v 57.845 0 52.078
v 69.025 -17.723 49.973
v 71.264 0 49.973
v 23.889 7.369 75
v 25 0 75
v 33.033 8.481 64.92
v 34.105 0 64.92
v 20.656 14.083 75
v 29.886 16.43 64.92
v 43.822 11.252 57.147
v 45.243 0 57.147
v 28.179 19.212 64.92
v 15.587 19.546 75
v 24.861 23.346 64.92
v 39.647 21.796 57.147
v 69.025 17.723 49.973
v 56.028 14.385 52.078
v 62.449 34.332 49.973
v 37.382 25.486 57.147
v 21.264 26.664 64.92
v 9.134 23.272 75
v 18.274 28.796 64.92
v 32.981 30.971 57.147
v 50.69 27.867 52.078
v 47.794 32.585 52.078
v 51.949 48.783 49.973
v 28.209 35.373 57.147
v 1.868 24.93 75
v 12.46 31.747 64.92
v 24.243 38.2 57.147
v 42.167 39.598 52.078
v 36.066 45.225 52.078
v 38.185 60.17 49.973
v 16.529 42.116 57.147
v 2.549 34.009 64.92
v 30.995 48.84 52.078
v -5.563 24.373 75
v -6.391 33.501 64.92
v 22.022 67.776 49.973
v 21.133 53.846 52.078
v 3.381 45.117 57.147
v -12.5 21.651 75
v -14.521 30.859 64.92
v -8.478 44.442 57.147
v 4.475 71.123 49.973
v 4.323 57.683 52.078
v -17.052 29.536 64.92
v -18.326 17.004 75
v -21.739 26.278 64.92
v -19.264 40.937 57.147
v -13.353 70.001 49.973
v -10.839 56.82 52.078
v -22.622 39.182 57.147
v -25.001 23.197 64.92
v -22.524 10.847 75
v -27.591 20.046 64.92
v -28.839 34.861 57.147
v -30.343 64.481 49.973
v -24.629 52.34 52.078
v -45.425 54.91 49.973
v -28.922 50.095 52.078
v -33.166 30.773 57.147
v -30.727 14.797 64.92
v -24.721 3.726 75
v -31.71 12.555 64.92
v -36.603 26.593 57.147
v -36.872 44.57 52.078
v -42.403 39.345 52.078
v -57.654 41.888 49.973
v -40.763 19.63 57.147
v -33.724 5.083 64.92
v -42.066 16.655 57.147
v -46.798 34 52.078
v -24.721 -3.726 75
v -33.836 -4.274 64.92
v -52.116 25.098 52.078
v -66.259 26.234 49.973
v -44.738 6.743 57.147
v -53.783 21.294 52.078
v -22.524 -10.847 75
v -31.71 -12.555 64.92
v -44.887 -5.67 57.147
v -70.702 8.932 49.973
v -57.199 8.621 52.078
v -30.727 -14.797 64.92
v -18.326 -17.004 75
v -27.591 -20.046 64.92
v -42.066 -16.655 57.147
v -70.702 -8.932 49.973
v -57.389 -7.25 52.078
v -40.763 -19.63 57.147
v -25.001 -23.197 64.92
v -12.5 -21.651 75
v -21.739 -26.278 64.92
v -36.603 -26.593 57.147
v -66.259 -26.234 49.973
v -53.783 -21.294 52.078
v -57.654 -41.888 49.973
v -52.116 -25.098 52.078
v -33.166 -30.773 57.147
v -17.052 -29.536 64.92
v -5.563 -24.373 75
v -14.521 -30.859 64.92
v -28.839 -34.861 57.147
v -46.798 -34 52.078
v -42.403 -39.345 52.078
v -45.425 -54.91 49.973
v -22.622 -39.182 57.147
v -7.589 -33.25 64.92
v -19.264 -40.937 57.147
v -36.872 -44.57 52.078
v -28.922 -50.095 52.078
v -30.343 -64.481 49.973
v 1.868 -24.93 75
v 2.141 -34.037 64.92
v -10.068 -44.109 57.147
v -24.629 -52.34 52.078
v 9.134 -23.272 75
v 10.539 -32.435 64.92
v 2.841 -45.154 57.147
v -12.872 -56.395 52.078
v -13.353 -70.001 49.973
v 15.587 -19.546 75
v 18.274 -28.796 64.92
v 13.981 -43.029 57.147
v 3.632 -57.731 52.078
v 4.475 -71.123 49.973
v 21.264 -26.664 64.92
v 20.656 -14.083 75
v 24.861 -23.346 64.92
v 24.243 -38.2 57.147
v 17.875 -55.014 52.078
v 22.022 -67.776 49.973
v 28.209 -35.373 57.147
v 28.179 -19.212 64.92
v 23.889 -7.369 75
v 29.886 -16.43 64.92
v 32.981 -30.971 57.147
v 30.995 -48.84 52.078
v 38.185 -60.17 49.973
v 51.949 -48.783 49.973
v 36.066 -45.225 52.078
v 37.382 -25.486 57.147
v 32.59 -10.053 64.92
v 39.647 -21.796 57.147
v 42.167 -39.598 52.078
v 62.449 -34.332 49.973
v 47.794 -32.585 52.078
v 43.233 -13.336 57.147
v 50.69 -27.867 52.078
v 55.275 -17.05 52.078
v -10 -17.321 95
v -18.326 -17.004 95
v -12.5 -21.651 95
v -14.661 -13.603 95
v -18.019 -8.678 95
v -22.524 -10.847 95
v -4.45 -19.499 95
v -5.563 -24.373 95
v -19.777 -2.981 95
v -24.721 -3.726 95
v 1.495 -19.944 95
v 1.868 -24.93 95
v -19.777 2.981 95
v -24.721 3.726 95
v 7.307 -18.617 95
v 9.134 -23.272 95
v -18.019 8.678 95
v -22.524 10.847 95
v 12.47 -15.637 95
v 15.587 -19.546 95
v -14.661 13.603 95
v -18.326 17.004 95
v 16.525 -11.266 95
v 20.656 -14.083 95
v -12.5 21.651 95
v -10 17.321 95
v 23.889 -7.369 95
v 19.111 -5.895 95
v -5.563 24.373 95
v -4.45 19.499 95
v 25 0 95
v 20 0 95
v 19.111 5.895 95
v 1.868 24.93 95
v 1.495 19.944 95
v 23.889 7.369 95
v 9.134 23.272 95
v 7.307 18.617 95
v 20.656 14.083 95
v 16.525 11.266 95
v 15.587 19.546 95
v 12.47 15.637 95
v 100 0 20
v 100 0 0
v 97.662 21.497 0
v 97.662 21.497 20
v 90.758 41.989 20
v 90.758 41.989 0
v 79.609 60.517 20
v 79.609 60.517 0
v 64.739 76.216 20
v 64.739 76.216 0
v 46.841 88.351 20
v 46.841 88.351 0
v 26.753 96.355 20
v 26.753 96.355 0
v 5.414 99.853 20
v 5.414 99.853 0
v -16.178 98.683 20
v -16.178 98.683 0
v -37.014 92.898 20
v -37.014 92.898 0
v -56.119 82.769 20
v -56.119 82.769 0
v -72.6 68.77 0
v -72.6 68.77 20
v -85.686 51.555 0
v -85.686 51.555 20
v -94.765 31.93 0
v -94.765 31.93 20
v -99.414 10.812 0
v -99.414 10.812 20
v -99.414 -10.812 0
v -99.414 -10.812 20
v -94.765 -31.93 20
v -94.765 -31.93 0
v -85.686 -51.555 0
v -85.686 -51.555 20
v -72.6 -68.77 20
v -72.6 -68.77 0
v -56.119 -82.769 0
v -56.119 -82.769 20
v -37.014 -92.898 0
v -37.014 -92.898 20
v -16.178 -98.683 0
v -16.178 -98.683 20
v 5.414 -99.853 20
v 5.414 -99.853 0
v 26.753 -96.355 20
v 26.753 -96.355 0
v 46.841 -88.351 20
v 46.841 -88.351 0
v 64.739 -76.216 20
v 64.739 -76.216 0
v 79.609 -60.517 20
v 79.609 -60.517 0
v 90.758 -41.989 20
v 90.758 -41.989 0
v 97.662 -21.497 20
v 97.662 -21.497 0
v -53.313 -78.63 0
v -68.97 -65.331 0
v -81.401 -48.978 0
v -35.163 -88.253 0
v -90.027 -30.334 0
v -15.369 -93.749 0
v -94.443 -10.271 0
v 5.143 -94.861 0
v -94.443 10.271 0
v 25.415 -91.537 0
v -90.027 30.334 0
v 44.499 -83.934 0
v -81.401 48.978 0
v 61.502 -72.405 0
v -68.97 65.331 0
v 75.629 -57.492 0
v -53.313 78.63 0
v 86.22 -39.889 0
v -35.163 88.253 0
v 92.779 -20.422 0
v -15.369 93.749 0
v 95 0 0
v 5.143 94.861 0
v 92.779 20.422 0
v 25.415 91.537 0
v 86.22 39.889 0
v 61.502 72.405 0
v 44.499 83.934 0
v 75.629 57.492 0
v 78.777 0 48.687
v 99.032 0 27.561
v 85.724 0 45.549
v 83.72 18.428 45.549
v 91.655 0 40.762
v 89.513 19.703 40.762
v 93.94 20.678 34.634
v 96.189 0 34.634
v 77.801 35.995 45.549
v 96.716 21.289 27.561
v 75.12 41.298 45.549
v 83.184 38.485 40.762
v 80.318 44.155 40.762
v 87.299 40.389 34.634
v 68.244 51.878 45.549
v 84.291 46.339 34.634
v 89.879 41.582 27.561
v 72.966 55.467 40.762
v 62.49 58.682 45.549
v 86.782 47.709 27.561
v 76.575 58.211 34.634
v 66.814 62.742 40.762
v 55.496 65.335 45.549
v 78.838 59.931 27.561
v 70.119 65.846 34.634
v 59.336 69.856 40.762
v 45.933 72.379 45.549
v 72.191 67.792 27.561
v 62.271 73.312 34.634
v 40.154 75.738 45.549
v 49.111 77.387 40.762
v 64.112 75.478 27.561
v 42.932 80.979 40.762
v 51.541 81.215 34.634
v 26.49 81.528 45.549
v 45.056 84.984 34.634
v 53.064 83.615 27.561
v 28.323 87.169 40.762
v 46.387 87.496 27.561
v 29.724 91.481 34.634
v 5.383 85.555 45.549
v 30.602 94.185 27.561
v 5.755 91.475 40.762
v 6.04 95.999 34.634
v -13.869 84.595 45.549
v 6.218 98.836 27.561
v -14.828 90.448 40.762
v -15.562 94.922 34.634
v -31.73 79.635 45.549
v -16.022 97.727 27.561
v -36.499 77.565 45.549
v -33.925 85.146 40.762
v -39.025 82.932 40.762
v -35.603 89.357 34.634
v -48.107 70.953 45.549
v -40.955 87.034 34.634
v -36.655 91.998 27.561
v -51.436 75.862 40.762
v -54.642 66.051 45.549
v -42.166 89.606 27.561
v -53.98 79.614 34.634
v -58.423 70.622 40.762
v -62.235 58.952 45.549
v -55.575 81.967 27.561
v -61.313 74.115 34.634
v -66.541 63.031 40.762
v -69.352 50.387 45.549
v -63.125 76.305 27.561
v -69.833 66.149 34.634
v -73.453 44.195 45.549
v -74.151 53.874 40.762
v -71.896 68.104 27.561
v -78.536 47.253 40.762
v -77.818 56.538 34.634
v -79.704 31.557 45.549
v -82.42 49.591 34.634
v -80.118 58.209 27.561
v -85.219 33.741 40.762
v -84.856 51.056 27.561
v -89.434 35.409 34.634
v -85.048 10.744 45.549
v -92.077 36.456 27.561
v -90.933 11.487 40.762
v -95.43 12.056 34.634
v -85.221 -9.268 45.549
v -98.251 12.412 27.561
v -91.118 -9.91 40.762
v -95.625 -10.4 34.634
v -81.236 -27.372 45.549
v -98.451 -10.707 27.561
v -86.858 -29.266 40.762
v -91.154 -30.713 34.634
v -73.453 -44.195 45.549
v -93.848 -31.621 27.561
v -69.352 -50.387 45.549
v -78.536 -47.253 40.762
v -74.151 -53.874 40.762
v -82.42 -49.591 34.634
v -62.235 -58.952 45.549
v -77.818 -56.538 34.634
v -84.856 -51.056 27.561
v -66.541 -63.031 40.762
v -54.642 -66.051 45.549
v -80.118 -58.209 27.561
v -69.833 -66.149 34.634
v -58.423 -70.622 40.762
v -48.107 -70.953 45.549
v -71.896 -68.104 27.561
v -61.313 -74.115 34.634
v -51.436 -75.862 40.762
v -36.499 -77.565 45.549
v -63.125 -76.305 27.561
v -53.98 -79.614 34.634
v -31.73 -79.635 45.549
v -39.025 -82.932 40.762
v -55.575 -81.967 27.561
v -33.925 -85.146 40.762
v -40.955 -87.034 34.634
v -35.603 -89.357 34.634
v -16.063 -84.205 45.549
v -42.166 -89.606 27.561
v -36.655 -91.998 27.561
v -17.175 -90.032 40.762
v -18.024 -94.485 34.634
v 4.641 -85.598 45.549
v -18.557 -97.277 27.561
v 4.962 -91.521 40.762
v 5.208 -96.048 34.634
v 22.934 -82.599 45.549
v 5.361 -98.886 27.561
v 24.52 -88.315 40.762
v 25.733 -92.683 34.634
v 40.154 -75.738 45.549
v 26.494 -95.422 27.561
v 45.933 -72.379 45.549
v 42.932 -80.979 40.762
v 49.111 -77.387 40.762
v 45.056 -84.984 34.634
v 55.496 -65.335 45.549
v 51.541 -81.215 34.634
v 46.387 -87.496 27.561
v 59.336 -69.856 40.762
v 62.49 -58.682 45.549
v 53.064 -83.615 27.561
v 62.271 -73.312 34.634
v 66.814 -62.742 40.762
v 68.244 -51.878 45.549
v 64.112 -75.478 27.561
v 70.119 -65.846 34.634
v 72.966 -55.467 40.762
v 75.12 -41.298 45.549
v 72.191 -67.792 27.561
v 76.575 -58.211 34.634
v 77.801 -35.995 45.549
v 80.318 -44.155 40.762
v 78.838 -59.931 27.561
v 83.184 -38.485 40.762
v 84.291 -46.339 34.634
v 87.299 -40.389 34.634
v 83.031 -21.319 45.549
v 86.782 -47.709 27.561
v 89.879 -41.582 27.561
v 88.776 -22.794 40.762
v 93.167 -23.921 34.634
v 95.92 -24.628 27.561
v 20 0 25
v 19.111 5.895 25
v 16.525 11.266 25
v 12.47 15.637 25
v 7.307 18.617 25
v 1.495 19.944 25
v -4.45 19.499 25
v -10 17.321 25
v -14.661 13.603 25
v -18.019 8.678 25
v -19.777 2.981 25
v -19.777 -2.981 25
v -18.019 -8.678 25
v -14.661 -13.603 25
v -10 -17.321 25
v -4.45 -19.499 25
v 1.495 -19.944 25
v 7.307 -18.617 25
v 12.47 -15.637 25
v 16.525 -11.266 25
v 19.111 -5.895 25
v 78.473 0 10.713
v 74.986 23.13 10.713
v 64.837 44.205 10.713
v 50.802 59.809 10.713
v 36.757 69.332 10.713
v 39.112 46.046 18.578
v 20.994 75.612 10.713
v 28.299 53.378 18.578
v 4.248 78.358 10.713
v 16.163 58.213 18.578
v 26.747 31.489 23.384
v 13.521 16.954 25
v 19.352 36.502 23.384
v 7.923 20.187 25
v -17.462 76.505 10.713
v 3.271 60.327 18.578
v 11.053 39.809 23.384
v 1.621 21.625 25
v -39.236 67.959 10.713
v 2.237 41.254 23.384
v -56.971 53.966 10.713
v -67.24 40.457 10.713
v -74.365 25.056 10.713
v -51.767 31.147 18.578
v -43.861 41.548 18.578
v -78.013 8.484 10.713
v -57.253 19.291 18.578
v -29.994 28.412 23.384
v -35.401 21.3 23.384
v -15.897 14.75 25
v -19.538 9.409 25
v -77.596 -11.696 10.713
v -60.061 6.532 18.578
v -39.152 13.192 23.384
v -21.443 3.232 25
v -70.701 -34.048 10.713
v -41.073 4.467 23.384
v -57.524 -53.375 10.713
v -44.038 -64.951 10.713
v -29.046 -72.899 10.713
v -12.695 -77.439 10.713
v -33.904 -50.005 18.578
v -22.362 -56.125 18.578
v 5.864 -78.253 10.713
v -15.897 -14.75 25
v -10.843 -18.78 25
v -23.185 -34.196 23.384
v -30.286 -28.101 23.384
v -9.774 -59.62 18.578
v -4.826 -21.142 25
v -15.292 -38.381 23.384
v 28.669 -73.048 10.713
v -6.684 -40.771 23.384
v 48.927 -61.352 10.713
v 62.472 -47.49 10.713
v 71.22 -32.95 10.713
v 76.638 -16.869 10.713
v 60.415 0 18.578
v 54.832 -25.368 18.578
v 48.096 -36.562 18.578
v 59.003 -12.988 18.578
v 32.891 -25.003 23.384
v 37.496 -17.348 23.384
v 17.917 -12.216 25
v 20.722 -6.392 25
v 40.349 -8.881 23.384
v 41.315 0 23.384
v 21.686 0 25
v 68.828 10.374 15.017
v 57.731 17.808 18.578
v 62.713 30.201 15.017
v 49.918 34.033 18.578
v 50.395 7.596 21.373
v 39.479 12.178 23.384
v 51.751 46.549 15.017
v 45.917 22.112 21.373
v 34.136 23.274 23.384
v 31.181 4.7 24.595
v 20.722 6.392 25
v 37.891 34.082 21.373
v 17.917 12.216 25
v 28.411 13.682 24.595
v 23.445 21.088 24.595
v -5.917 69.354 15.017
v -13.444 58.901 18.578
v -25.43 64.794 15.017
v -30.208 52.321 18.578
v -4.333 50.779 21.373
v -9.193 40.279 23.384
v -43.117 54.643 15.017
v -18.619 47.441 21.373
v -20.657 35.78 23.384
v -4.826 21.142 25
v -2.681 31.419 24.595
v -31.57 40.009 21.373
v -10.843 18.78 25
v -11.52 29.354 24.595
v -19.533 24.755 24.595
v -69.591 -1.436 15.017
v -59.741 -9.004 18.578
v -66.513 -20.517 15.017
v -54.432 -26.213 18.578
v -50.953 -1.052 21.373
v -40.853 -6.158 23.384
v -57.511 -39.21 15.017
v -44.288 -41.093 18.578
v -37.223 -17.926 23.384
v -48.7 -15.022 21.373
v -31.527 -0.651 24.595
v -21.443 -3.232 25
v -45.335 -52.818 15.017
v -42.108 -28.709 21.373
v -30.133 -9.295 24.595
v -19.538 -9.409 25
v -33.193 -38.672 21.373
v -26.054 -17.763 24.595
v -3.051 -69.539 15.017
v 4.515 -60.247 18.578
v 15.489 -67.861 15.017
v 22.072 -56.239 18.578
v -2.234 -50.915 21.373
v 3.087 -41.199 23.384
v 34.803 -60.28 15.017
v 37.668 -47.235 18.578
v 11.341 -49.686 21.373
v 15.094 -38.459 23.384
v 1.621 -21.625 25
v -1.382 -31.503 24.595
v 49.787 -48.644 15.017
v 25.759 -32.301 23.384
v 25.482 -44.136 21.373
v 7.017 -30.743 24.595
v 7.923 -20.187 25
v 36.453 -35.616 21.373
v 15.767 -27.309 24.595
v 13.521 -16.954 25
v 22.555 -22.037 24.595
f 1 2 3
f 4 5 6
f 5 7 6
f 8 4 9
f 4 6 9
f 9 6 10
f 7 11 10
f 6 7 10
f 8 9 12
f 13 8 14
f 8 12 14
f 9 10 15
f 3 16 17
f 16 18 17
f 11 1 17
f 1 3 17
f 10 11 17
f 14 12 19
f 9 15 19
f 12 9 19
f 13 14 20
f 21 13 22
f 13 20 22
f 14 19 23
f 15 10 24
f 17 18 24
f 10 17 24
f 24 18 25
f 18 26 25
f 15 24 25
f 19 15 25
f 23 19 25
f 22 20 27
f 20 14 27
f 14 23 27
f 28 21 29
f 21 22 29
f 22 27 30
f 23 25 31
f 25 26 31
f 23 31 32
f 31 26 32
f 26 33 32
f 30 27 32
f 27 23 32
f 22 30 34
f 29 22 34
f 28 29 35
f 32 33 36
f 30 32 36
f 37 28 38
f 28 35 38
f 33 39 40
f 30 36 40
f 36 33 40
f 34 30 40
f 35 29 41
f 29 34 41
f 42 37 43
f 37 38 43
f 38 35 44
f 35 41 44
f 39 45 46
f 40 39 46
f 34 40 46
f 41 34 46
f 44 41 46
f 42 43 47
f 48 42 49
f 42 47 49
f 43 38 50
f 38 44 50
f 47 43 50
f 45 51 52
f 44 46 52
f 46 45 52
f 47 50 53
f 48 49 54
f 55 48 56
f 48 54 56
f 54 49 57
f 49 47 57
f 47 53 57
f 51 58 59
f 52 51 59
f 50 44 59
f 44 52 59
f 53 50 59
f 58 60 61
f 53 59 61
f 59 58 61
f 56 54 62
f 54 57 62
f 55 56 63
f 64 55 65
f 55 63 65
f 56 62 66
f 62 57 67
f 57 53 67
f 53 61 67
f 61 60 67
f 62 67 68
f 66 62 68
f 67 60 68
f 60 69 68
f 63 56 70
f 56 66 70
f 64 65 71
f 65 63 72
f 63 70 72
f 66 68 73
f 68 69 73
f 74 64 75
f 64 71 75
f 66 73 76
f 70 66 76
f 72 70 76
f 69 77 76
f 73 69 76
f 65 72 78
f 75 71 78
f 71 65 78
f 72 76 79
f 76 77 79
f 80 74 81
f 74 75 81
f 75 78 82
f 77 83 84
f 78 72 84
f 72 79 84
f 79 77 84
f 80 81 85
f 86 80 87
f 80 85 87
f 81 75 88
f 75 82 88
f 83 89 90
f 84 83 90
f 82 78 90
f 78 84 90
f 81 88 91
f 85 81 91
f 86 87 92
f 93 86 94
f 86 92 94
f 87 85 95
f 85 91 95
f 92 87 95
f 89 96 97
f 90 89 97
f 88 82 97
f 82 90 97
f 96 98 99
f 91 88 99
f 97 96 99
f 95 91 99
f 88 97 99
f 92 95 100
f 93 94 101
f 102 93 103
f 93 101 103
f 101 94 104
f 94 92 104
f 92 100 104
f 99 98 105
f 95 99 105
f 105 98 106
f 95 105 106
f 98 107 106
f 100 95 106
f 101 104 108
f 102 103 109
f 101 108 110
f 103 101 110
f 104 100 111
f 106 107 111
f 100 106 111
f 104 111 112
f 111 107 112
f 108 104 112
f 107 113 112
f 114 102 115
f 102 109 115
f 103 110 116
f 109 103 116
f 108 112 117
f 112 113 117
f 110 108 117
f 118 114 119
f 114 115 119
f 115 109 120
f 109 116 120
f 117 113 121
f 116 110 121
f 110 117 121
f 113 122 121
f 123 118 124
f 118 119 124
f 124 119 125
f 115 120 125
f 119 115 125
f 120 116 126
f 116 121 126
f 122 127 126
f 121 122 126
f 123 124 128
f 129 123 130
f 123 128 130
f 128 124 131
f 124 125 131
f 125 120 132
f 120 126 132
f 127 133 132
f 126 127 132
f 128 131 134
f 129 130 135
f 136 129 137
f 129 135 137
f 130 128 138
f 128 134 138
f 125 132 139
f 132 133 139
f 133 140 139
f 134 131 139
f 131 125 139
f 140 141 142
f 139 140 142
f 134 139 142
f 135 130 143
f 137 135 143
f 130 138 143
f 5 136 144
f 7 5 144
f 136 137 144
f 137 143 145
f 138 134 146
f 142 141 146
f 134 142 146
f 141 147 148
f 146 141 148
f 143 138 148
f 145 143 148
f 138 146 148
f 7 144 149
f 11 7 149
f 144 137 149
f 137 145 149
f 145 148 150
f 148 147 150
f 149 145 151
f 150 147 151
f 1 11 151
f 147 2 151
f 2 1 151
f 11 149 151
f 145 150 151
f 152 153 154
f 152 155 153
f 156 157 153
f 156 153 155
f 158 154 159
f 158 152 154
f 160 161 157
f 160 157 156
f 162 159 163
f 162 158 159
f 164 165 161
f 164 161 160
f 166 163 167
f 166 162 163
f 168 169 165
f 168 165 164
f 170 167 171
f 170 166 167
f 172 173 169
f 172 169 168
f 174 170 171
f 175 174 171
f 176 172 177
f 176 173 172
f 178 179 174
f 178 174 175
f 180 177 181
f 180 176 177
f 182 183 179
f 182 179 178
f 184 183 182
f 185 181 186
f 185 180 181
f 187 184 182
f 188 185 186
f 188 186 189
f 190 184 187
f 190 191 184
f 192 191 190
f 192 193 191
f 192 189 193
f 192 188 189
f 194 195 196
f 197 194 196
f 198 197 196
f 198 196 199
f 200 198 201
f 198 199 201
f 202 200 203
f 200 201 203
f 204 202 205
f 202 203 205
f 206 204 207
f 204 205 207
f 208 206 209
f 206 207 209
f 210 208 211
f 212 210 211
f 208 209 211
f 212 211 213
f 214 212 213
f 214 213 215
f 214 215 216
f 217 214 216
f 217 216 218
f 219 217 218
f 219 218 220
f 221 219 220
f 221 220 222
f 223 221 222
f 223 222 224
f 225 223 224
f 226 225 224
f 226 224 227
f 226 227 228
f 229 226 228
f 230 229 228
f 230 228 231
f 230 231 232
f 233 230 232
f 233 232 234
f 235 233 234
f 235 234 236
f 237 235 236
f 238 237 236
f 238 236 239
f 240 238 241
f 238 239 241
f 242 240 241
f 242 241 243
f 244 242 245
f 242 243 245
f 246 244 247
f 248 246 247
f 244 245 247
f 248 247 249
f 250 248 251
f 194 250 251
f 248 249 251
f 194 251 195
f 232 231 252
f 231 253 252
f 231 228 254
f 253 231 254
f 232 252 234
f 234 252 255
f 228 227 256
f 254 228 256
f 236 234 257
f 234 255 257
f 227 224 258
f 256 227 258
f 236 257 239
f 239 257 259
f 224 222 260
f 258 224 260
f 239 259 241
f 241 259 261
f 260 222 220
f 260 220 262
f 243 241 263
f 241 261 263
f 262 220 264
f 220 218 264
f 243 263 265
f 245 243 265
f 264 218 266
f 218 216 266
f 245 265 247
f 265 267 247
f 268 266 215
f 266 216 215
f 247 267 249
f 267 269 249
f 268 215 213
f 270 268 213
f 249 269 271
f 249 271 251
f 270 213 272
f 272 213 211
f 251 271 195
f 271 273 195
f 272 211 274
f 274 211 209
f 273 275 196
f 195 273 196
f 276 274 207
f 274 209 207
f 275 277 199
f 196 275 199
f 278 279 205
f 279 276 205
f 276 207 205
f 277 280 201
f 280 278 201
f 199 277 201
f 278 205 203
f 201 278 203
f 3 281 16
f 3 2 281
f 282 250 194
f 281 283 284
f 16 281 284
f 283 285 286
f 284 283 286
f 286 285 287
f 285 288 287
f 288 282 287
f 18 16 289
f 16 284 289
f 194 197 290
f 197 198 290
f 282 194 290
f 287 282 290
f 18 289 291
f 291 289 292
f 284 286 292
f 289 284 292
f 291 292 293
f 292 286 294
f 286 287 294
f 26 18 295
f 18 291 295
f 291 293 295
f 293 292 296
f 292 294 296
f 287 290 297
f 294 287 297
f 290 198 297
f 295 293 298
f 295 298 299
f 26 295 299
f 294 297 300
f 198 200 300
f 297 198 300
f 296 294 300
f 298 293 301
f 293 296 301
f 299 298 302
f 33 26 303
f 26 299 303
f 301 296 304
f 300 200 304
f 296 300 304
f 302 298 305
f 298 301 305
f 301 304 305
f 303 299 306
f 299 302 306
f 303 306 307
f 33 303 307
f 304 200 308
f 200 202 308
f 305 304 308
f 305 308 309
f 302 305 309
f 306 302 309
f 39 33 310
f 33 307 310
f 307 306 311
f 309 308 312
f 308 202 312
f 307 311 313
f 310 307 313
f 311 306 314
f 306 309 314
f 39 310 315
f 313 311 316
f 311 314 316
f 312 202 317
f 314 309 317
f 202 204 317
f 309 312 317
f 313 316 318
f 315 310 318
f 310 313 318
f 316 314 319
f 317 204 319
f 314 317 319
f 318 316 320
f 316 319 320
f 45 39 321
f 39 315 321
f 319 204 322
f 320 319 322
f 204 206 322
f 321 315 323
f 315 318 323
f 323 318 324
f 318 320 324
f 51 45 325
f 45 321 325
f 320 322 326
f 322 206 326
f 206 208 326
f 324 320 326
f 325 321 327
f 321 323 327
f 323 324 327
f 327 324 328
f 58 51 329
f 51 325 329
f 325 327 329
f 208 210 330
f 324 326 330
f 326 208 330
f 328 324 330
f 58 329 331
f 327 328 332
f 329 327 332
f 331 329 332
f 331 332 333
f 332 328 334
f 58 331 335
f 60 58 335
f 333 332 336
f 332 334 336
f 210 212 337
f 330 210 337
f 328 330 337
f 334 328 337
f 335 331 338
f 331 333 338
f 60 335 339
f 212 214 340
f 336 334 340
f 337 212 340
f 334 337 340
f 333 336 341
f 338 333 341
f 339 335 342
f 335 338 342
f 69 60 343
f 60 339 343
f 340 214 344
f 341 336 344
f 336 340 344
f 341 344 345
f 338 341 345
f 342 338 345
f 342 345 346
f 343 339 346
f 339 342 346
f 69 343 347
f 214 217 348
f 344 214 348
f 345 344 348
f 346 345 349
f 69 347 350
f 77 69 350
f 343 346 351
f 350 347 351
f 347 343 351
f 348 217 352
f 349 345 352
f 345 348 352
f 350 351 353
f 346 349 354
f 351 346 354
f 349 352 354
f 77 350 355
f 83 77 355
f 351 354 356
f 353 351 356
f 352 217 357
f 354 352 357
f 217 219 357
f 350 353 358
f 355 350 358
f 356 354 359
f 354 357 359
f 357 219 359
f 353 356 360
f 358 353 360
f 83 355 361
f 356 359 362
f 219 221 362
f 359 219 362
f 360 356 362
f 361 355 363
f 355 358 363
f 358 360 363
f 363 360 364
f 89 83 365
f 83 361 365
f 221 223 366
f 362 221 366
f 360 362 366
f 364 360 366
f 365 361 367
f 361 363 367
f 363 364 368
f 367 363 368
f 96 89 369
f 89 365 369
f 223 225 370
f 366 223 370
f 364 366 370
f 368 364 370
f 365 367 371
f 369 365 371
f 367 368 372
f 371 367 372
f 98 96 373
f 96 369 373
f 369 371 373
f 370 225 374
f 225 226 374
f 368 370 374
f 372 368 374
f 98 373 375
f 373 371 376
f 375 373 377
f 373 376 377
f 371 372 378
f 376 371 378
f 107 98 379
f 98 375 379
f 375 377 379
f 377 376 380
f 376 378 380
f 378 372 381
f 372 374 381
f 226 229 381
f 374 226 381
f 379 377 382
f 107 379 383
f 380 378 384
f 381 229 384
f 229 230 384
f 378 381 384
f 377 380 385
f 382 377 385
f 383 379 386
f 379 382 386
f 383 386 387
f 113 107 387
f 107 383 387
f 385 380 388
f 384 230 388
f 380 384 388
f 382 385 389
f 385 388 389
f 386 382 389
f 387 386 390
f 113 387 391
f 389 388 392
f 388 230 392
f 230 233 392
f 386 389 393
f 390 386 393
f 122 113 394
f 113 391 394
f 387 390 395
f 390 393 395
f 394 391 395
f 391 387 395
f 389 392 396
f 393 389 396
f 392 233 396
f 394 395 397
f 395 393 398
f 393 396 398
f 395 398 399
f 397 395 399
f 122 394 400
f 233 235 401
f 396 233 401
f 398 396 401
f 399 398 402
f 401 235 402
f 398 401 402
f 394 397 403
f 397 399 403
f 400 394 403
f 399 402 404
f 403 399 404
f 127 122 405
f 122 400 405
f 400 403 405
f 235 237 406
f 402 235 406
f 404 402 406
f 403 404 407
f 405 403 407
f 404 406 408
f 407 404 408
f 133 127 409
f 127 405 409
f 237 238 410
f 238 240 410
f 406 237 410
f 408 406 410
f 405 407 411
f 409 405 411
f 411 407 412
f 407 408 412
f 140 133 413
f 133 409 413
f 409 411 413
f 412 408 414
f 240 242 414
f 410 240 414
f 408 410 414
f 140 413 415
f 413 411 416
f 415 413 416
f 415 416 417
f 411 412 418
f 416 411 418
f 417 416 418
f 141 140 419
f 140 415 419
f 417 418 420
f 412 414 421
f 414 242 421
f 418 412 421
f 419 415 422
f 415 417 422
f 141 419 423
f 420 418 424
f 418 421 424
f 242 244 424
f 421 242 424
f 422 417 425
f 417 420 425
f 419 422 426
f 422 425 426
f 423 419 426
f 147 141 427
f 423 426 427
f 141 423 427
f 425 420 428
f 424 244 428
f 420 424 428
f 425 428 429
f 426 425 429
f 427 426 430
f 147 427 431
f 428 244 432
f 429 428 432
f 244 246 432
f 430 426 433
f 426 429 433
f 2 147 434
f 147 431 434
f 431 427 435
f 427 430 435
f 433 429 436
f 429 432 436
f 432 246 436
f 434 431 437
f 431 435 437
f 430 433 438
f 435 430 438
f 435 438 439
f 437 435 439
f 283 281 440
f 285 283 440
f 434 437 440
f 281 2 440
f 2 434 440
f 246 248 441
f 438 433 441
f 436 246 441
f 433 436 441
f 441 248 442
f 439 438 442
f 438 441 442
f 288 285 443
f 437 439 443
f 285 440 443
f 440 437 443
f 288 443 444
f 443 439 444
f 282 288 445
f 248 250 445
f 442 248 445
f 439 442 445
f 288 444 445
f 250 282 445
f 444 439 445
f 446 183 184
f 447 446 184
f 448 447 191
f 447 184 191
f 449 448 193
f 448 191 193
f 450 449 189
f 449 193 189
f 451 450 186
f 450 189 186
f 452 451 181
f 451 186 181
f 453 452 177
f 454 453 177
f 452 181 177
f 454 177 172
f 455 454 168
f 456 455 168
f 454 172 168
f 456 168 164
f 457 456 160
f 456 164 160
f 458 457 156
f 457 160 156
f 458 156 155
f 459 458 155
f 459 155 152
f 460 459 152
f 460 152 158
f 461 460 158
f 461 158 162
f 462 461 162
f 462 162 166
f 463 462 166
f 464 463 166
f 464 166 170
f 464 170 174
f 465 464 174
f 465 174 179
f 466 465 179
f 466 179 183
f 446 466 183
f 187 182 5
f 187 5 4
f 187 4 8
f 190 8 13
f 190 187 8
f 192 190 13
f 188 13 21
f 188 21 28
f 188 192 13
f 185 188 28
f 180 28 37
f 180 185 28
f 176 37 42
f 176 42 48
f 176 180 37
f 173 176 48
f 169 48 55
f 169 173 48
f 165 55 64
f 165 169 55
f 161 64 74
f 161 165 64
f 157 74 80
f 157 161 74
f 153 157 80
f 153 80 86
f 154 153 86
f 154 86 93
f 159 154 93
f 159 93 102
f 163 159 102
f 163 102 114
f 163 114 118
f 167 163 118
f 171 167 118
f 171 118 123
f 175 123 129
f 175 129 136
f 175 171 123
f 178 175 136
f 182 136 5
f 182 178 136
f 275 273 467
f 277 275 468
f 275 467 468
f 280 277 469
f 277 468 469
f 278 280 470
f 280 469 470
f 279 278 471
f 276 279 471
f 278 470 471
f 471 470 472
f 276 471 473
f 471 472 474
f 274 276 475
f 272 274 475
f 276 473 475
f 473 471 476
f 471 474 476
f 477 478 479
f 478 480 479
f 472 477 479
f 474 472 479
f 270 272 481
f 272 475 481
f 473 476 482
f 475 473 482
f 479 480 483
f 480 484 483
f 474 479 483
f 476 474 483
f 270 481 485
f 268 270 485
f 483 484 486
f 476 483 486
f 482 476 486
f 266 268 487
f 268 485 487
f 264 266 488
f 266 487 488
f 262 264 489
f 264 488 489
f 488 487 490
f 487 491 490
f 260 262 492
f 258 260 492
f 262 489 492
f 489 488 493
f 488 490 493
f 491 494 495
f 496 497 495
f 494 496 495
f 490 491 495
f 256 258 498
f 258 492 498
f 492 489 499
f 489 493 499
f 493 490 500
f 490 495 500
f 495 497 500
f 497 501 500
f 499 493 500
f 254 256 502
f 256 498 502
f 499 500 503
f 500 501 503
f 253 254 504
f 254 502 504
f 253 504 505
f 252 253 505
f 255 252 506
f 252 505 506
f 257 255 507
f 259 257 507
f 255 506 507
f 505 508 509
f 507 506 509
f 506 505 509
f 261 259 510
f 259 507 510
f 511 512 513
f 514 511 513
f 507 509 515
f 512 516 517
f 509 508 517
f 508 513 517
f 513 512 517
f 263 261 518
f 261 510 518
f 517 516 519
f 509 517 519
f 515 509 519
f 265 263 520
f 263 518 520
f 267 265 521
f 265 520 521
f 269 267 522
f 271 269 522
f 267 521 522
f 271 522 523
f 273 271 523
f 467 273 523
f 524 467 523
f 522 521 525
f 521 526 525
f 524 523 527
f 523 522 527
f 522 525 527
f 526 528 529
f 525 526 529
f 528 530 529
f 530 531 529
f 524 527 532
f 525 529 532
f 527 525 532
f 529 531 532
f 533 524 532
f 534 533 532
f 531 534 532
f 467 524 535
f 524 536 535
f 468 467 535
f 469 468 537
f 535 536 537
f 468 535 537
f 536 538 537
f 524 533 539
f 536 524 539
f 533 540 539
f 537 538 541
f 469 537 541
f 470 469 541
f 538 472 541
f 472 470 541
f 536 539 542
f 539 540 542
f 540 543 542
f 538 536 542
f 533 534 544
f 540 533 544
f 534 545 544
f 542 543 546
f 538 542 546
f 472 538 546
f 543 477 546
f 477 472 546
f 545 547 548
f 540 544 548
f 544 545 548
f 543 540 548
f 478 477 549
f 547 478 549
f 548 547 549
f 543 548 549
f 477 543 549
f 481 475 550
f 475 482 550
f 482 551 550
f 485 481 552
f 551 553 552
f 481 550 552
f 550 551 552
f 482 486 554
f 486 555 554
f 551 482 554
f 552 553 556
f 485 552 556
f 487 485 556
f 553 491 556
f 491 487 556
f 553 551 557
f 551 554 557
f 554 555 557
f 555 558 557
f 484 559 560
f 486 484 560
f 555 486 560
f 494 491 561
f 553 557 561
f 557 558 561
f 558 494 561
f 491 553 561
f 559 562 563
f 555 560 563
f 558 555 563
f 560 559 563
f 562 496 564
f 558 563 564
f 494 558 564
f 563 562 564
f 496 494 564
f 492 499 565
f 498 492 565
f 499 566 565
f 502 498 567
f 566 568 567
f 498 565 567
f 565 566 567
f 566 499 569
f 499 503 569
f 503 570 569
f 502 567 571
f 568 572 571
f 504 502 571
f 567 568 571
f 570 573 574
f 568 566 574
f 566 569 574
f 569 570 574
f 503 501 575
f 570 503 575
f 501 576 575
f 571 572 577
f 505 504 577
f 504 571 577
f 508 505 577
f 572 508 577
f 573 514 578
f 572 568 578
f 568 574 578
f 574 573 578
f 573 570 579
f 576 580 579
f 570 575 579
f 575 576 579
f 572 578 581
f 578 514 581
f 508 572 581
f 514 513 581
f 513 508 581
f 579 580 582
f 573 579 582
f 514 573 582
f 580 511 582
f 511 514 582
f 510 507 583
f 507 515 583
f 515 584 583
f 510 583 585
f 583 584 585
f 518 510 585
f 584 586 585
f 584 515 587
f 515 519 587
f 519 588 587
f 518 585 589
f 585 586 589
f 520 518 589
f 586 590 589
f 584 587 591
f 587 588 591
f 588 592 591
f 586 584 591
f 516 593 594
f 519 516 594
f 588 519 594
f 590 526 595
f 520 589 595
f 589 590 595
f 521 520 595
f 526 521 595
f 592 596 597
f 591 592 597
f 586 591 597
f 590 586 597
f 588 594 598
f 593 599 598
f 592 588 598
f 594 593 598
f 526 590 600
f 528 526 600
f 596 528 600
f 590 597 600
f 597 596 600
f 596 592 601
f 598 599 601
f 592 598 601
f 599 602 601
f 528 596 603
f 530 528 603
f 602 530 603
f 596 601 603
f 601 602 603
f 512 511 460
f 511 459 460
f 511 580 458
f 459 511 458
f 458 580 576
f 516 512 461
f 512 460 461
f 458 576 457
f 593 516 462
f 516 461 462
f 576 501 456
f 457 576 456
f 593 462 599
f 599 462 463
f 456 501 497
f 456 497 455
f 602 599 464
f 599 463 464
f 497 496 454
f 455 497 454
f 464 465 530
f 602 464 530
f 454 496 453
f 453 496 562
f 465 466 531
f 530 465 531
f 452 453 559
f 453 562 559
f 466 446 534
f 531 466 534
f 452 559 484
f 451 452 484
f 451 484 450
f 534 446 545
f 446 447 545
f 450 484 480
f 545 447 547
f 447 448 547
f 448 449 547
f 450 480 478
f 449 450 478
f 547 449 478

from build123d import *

# Parameters (mm, degrees)
SKETCH1_R           = 100
SKETCH1_R_2         = 95
BOSS_EXTRUDE1_DEPTH = 25
SKETCH2_R           = 100
BOSS_EXTRUDE2_DEPTH = 25
SKETCH3_R           = 20
CUT_EXTRUDE1_DEPTH  = 25
BOSS_EXTRUDE3_START = 25
SKETCH4_R           = 25
SKETCH4_R_2         = 20
BOSS_EXTRUDE3_DEPTH = 25
FILLET1_R           = 30
FILLET2_R           = 120
FILLET3_R           = 60
BOSS_EXTRUDE4_START = 20
SKETCH5_R           = 25
SKETCH5_R_2         = 20
BOSS_EXTRUDE4_DEPTH = 20


with BuildPart() as part:
    # Sketch1 → Boss-Extrude1 (new body)
    with BuildSketch(Plane.XY):
        Circle(SKETCH1_R)
        Circle(SKETCH1_R_2, mode=Mode.SUBTRACT)
    extrude(amount=BOSS_EXTRUDE1_DEPTH)

    # Sketch2 → Boss-Extrude2 (add)
    with BuildSketch(Plane.XY.offset(25)):
        Circle(SKETCH2_R)
    extrude(amount=BOSS_EXTRUDE2_DEPTH)

    # Sketch3 → Cut-Extrude1 (cut)
    with BuildSketch(Plane.XY.offset(50)):
        Circle(SKETCH3_R)
    extrude(amount=-CUT_EXTRUDE1_DEPTH, mode=Mode.SUBTRACT)

    # Sketch4 → Boss-Extrude3 (add)
    with BuildSketch(Plane.XY.offset(50).offset(BOSS_EXTRUDE3_START)):
        Circle(SKETCH4_R)
        Circle(SKETCH4_R_2, mode=Mode.SUBTRACT)
    extrude(amount=-BOSS_EXTRUDE3_DEPTH)

    # Fillet1
    fillet1_edges = [part.edges().sort_by_distance(p)[0] for p in [
        (-100, 0, 50),
    ]]
    fillet(fillet1_edges, radius=FILLET1_R)

    # Fillet2
    # the kernel refuses this fillet: 120 mm, written as the material it adds along each edge
    with BuildSketch(Plane(origin=(0, 0, 25), x_dir=(1, 0, 0), z_dir=(0, -1, 0))) as fillet2_piece_1:
        with BuildLine():
            CenterArc((21.685608507, -120), FILLET2_R, 52.341537994, 37.658462006)
            Line((21.685608507, 0), (21.685608507, 2.4))
            Line((21.685608507, 2.4), (95, 2.4))
            Line((95, 2.4), (97.4, 0))
            ThreePointArc((97.4, 0), (97.4, -12.5), (96.46628783, -23.1))
            Line((96.46628783, -23.1), (95, -25))
        make_face()
    revolve(axis=Axis((0, 0, 25), (0, 0, 1)))

    # Fillet3
    # the kernel refuses this fillet: 60 mm, written as the material it adds along each edge
    with BuildSketch(Plane(origin=(0, 0, 50), x_dir=(1, 0, 0), z_dir=(0, -1, 0))) as fillet3_piece_1_section:
        with BuildLine():
            CenterArc((73.791247331, 59.920111453), FILLET3_R, 215.59146616, 51.994236434)
            Line((71.26374911, -0.026629516), (71.010999288, -6.021303613))
            ThreePointArc((71.010999288, -6.021303613), (70, -6), (25, -6))
            Line((25, -6), (19, 0))
            ThreePointArc((19, 0), (19, 12.5), (20.120875267, 21.507988855))
            Line((20.120875267, 21.507988855), (25, 25))
        make_face()
    fillet3_piece_1 = revolve(axis=Axis((0, 0, 50), (0, 0, 1)), mode=Mode.PRIVATE)
    fillet3_piece_1 = fillet3_piece_1 - Plane(origin=(0, 0, 57.041337481), x_dir=(1, 0, 0), z_dir=(0, 0, 1)) * Cylinder(20, 286, mode=Mode.PRIVATE)
    add(fillet3_piece_1)

    # Sketch5 → Boss-Extrude4 (add)
    with BuildSketch(Plane.XY.offset(75).offset(BOSS_EXTRUDE4_START)):
        Circle(SKETCH5_R)
        Circle(SKETCH5_R_2, mode=Mode.SUBTRACT)
    extrude(amount=-BOSS_EXTRUDE4_DEPTH)


solid = part.part
